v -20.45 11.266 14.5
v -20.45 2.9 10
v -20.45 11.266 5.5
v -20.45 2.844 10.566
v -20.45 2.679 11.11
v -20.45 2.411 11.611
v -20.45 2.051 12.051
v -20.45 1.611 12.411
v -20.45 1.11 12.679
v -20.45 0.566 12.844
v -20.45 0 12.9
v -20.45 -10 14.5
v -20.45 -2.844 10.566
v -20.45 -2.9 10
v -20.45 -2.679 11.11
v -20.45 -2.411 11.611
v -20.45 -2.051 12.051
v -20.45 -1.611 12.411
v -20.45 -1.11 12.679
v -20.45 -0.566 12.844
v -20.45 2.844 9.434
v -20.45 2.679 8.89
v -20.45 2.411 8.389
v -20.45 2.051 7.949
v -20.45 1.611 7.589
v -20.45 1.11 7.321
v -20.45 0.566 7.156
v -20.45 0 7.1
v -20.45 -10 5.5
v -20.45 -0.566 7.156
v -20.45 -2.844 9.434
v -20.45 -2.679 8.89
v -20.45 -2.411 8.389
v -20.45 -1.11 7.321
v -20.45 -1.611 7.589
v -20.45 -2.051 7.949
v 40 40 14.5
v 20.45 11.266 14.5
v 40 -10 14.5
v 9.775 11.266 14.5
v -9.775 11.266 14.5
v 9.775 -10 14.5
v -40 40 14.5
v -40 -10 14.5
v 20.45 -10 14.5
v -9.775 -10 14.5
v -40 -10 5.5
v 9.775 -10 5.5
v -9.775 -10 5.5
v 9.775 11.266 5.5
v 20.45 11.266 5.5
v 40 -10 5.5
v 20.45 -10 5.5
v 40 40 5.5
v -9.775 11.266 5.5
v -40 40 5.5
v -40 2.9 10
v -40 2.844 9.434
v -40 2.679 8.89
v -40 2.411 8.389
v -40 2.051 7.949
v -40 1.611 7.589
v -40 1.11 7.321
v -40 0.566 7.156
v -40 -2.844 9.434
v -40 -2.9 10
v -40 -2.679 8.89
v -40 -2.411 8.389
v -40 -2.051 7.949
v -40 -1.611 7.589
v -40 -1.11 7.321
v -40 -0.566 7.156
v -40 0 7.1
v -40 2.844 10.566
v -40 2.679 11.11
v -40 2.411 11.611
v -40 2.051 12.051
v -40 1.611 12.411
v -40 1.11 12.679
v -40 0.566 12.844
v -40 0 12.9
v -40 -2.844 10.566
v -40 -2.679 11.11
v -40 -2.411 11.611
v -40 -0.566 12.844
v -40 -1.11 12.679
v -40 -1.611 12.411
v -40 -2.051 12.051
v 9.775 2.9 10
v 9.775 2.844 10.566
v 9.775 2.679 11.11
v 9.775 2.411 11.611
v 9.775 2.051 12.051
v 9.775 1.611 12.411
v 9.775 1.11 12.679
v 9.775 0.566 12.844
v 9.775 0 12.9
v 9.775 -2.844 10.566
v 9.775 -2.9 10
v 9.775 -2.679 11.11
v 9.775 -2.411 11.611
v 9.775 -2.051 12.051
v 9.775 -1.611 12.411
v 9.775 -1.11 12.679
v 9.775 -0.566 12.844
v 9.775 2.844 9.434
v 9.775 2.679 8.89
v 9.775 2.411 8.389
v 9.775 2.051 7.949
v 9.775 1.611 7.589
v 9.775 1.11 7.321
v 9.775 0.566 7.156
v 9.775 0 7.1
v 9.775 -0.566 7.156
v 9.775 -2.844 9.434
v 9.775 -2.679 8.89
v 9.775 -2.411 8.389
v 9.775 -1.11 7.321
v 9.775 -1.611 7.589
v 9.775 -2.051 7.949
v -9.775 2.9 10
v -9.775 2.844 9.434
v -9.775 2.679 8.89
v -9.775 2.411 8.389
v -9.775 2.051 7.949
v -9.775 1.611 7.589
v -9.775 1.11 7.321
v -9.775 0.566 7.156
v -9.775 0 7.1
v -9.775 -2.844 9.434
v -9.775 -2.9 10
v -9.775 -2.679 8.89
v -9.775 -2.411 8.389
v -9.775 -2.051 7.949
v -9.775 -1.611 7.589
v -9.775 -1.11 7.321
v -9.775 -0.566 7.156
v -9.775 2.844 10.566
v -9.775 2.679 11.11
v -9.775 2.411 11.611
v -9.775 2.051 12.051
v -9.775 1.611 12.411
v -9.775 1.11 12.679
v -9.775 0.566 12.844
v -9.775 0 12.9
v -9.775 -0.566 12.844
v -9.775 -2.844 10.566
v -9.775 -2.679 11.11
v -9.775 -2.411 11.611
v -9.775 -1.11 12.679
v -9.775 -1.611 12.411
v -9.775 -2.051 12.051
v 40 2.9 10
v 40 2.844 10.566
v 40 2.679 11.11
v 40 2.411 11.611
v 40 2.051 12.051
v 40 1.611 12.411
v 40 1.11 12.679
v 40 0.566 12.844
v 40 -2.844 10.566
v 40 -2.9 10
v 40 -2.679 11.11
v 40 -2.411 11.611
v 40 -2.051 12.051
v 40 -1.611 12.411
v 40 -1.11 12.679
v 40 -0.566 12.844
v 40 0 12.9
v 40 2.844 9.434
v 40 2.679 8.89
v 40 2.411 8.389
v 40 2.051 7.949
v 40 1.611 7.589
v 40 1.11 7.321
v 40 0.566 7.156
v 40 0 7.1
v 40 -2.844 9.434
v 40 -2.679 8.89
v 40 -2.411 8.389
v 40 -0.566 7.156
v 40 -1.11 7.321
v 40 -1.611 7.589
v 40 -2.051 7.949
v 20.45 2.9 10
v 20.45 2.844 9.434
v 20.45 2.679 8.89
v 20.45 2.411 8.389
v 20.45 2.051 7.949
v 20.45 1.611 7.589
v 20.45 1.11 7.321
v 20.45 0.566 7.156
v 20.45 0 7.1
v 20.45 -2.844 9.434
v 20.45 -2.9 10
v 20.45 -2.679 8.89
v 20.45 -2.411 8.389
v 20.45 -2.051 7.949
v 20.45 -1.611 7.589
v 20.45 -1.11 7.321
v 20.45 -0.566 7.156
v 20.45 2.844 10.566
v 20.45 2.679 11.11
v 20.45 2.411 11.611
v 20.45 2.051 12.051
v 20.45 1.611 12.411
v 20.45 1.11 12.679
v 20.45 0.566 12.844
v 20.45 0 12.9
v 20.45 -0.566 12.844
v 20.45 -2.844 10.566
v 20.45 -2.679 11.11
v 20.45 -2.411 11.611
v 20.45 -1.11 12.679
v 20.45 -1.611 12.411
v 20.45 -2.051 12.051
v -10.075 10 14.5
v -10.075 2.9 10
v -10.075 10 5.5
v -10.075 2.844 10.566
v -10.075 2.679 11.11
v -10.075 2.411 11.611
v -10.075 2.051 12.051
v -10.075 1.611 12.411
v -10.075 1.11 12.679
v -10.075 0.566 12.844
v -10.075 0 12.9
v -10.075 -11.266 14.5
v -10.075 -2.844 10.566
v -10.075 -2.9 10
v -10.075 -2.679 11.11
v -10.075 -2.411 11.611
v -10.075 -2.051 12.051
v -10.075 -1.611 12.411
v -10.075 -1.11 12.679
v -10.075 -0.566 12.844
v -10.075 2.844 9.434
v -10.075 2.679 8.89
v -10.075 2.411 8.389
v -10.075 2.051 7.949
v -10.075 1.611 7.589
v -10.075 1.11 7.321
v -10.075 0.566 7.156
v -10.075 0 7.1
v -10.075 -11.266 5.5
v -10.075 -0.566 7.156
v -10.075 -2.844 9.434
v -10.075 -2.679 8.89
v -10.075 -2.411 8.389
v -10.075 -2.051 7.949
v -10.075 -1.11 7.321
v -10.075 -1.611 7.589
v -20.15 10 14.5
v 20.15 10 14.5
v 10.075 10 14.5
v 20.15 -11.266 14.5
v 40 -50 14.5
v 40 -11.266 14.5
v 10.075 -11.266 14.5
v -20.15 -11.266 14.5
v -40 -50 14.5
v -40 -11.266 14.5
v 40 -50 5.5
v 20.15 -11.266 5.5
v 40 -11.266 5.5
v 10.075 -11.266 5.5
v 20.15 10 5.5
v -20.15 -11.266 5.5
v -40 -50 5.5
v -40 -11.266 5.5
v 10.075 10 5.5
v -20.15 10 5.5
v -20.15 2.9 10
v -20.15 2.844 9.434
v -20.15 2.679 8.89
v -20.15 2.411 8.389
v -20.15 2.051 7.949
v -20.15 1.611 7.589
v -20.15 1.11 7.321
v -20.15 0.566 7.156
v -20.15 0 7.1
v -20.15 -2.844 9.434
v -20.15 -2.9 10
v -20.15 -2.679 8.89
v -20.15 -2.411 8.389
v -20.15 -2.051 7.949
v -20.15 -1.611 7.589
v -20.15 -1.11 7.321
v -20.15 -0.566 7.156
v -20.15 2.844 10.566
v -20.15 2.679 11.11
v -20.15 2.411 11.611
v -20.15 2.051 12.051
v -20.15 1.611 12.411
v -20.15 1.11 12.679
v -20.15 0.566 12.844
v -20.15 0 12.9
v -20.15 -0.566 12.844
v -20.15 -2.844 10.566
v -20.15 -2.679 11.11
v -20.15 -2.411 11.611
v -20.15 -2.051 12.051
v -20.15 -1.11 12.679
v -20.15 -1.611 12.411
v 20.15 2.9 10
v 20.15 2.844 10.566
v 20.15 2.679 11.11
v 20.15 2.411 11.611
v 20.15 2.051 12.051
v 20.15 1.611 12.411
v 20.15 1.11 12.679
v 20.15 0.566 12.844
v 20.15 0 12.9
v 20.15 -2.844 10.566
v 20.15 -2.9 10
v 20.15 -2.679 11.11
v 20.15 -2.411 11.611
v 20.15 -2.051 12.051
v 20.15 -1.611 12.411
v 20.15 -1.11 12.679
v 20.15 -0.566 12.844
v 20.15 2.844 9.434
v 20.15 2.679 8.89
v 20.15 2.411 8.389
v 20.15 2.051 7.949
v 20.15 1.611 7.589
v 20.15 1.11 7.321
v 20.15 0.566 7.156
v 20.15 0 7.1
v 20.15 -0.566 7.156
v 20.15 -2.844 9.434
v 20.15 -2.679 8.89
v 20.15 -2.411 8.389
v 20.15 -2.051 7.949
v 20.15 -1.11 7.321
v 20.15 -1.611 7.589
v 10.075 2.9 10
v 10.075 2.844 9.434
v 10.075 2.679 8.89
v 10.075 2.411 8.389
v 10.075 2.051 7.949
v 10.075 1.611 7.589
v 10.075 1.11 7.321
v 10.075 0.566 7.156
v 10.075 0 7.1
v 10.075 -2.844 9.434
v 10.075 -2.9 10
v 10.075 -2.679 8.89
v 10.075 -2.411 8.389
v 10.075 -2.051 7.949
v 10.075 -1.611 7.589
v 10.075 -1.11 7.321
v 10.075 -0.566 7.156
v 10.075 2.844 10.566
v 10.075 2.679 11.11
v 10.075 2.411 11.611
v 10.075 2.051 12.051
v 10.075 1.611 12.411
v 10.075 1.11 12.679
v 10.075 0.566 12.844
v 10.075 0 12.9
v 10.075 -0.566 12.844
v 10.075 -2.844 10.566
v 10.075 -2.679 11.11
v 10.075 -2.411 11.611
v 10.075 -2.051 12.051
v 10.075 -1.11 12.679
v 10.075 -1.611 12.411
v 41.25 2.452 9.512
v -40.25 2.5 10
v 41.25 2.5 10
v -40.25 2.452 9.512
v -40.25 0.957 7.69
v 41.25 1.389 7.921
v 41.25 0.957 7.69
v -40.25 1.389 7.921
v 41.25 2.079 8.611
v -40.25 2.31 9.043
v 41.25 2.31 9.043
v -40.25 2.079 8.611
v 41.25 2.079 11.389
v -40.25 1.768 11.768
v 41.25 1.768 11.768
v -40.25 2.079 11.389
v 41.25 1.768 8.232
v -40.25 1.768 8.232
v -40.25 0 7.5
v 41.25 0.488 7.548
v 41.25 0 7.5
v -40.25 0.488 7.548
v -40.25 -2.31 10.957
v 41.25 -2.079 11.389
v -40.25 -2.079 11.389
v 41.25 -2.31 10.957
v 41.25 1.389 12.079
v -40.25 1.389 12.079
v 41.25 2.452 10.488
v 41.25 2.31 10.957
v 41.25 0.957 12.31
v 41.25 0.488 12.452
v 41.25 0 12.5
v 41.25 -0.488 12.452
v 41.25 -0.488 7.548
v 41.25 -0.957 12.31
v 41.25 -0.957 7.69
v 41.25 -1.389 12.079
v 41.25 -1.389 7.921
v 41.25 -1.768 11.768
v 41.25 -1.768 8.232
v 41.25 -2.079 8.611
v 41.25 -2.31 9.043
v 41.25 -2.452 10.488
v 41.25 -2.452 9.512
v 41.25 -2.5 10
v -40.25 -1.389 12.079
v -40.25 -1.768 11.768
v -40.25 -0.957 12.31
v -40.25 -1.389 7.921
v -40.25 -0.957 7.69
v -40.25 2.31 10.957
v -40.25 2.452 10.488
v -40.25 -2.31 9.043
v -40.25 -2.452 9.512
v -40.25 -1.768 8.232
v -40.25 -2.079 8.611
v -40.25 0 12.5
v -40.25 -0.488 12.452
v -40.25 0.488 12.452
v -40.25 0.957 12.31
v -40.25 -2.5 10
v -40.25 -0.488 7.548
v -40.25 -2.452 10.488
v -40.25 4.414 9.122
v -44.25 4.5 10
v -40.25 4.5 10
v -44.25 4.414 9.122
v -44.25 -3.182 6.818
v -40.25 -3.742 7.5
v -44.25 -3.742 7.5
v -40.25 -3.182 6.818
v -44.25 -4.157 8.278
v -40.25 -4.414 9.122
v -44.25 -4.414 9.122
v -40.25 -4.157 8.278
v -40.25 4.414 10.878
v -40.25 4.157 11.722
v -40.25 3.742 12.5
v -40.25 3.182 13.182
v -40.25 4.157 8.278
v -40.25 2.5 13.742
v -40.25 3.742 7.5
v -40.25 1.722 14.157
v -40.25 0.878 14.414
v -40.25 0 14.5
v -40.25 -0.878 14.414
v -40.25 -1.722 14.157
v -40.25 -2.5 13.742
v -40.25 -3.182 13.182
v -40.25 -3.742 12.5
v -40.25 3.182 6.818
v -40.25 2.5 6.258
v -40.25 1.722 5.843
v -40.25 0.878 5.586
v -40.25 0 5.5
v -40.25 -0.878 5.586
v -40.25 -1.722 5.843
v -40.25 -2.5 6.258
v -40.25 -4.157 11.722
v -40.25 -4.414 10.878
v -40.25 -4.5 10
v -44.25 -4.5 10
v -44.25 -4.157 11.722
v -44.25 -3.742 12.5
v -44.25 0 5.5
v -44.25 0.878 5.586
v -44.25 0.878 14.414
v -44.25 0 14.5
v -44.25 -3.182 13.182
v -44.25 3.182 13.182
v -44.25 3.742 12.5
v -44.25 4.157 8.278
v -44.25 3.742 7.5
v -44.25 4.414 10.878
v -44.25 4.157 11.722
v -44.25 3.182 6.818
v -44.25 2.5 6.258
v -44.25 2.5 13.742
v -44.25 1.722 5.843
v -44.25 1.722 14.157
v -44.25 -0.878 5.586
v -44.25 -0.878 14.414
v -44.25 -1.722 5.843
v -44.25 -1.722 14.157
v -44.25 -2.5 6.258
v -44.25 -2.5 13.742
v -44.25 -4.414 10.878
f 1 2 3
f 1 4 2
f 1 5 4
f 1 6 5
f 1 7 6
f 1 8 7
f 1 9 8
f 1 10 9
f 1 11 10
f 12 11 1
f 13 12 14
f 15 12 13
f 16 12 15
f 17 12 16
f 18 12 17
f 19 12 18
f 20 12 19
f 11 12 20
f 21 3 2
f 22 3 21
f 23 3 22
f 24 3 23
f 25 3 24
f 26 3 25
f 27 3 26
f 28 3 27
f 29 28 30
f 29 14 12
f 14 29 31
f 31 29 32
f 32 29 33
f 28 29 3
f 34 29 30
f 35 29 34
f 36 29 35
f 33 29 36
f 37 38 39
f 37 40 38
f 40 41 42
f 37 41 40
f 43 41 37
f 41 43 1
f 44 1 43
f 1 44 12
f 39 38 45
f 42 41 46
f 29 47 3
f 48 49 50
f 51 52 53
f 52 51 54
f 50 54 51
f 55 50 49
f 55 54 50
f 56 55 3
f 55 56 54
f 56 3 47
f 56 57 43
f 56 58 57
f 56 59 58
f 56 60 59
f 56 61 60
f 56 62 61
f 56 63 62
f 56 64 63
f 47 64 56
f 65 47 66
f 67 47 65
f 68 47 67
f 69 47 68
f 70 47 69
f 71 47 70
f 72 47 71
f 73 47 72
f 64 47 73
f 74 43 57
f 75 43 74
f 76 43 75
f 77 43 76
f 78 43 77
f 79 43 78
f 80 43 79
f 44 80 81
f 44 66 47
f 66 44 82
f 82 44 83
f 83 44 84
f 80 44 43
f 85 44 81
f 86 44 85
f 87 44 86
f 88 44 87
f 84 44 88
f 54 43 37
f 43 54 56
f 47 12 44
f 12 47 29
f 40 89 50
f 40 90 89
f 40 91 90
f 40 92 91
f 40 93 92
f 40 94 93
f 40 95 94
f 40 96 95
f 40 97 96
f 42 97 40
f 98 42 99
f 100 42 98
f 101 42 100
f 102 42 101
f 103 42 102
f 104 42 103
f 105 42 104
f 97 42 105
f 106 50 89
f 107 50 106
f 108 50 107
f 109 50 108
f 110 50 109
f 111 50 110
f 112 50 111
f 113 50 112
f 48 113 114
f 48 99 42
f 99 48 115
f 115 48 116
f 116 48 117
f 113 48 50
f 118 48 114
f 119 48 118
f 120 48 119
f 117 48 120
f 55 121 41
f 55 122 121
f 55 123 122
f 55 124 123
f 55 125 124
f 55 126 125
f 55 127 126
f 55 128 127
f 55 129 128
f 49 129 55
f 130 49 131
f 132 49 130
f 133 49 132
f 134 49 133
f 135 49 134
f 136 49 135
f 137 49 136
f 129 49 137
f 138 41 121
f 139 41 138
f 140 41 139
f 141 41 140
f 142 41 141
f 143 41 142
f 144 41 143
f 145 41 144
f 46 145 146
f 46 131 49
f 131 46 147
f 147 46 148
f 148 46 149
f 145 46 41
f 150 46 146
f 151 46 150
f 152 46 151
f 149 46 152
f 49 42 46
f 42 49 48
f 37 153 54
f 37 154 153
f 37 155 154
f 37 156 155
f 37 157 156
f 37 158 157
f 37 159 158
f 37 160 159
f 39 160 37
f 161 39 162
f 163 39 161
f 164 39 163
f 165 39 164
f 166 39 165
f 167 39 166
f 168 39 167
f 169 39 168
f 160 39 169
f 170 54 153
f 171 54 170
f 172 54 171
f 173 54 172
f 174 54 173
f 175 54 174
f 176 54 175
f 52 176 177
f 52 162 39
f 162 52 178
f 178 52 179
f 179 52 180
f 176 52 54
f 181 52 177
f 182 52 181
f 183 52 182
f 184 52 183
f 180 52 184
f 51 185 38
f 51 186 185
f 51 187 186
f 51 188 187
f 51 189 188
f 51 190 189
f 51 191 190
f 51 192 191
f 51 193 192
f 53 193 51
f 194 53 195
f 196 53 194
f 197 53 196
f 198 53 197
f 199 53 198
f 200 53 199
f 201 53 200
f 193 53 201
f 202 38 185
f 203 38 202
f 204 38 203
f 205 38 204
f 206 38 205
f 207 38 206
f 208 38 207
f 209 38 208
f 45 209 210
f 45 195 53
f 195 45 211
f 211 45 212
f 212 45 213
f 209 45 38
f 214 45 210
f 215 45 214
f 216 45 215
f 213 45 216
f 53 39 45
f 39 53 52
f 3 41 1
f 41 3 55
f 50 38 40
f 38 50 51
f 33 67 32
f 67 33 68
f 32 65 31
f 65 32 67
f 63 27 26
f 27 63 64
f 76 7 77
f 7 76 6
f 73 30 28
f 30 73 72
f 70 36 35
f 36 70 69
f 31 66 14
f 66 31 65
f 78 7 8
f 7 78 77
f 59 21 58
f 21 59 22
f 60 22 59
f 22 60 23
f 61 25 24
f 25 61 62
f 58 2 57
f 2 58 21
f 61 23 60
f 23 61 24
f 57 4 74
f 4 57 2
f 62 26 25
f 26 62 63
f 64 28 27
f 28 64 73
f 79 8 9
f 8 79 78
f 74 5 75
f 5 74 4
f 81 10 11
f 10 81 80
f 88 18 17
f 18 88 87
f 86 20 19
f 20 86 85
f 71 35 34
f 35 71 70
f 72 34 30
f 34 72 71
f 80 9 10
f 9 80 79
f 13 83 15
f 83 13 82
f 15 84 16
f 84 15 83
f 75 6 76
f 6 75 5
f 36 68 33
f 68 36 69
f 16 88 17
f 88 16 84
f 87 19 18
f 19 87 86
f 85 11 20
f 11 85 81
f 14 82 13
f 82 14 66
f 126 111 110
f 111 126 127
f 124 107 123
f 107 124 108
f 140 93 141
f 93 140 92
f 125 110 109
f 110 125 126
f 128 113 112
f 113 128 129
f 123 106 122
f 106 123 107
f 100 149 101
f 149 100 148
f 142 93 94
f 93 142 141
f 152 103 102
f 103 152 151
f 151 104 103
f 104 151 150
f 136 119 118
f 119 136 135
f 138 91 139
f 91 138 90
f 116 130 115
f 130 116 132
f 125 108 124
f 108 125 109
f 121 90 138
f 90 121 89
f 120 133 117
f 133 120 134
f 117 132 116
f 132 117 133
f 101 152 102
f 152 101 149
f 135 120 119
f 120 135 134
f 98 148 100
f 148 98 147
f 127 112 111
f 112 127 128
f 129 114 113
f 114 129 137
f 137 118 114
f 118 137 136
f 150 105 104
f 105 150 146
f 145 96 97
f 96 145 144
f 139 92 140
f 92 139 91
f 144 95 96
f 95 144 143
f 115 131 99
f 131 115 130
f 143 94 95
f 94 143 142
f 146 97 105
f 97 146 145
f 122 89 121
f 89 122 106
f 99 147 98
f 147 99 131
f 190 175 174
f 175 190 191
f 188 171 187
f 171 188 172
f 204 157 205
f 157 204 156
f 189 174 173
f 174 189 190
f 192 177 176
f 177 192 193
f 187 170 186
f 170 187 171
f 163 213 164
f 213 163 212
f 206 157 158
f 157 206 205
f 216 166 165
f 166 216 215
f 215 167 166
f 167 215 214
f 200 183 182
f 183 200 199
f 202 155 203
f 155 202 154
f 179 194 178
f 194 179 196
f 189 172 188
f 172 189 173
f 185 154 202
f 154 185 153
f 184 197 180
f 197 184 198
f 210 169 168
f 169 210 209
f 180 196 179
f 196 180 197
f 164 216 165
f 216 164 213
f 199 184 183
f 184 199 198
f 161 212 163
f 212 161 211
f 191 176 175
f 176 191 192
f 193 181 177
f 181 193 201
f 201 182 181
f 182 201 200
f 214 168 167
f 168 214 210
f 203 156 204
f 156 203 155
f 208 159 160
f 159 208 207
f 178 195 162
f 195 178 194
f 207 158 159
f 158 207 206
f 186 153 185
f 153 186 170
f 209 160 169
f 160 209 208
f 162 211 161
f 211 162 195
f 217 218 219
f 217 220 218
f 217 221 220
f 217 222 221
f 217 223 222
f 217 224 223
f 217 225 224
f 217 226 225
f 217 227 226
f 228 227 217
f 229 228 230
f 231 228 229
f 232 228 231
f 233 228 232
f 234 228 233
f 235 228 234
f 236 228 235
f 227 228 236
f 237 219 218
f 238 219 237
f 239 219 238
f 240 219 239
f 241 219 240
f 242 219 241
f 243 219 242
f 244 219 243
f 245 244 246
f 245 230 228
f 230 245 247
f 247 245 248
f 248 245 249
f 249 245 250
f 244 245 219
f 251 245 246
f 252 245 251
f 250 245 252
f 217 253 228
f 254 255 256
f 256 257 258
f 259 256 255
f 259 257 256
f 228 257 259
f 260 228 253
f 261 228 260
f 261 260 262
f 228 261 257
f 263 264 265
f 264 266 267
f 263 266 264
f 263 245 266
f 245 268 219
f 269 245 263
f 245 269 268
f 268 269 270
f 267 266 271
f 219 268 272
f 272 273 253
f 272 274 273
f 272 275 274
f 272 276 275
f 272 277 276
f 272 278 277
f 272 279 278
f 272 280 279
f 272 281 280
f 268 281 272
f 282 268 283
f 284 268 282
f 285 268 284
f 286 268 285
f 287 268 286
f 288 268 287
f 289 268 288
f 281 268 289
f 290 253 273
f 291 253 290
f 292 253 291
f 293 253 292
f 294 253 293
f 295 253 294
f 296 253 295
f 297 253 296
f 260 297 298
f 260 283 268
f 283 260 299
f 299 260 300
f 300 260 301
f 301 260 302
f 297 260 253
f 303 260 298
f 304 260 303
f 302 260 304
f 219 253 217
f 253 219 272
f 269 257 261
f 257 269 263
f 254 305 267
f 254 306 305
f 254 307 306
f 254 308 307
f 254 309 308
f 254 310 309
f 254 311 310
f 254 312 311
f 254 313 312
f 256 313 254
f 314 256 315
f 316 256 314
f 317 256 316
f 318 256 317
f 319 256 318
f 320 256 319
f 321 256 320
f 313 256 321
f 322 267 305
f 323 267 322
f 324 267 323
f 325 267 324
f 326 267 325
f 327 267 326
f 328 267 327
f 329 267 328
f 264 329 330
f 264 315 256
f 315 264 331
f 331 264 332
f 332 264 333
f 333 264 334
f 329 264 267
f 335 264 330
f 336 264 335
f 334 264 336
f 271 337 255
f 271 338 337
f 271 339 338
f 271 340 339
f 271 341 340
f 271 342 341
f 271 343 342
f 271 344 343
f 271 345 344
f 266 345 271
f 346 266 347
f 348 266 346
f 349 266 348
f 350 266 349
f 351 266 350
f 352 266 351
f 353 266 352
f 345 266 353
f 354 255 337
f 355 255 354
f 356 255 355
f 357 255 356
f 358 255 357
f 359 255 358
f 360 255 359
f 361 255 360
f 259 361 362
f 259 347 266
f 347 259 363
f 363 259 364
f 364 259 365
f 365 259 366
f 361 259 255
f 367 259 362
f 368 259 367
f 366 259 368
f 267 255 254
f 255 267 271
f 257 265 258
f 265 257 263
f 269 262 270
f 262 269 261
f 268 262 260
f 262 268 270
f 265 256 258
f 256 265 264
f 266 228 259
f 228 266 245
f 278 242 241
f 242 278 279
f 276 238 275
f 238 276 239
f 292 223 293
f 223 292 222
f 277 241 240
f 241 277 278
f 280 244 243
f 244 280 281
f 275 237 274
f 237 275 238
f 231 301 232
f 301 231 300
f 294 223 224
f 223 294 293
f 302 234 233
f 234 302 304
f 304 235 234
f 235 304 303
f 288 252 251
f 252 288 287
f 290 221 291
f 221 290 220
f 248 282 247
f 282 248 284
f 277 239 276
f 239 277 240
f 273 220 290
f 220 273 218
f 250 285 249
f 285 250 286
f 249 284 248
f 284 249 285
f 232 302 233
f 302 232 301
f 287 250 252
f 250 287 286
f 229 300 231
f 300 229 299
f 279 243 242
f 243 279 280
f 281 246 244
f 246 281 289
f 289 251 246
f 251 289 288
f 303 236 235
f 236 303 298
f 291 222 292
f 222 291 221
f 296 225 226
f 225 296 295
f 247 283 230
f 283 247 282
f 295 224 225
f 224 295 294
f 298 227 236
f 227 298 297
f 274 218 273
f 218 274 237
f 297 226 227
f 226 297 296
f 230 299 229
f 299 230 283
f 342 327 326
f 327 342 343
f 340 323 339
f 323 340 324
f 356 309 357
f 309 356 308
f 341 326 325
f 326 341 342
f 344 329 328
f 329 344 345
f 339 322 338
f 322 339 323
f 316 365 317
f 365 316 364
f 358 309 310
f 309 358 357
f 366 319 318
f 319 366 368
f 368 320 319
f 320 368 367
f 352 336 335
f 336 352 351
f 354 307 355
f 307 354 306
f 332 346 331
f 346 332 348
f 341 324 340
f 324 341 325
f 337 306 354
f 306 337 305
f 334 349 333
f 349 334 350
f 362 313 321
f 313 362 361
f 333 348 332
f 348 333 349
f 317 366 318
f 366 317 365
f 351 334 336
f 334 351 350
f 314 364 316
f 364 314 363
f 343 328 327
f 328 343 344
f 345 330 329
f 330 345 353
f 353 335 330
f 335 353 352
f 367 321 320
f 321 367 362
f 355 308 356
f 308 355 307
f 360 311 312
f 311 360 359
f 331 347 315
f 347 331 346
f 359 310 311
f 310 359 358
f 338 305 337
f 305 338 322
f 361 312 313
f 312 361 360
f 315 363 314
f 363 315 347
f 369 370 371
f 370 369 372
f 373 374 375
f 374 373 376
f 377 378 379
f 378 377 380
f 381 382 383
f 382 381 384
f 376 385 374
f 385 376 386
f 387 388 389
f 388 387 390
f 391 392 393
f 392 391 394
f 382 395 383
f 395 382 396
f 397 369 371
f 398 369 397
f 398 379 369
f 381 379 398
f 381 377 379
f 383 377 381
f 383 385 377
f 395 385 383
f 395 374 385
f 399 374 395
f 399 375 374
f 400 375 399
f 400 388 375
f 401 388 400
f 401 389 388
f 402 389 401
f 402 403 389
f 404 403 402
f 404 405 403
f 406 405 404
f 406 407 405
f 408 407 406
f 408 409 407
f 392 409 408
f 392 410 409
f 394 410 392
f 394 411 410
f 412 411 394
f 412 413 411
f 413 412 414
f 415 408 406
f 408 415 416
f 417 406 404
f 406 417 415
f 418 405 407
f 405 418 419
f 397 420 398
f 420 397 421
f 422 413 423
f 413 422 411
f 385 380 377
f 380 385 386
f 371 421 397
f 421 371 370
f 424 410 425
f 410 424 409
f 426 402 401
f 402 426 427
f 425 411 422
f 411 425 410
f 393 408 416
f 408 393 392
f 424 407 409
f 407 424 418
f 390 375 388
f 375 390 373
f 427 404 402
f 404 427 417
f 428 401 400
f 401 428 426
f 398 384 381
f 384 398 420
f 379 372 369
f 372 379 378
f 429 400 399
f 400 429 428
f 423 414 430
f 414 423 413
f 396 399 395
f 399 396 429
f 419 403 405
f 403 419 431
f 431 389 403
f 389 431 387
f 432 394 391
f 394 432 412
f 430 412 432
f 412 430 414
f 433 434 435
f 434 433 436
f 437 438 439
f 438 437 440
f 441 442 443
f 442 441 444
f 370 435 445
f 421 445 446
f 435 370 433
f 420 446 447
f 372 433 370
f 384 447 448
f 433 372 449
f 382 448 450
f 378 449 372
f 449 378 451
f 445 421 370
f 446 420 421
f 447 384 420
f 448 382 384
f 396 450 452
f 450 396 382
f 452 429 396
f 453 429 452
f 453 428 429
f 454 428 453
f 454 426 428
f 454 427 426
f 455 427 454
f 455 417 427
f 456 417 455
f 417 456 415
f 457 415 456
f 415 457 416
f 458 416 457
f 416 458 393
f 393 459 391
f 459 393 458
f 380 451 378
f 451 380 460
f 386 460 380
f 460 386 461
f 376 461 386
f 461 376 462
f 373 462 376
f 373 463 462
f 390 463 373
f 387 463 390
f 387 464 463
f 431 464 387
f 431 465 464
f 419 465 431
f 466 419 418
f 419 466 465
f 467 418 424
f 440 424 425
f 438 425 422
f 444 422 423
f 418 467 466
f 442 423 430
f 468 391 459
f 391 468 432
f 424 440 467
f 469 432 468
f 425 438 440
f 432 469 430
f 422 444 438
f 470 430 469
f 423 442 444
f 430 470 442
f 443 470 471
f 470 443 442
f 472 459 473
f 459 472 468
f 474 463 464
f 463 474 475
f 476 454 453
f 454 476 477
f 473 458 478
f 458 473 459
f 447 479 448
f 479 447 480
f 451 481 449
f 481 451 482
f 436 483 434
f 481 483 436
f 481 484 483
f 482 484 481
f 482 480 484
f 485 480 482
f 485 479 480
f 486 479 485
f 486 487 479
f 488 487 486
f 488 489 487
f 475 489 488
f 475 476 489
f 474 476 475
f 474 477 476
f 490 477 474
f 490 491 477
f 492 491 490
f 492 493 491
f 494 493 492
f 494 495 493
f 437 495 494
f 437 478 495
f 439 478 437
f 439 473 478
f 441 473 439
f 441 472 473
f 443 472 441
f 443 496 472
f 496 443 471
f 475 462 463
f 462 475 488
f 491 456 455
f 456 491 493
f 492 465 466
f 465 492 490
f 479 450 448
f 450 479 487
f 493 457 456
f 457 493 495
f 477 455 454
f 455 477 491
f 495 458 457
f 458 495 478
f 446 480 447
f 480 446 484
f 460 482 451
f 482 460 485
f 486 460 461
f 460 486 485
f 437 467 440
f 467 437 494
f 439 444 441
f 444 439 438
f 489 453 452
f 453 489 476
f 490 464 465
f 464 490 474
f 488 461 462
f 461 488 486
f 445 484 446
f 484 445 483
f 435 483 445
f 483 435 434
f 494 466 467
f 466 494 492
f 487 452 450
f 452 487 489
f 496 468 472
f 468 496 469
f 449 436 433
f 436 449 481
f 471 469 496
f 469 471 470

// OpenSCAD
$fn = 32;

// ------------------------------------------------------------------------
// Butt hinge: hinge 80 mm, leaf swung 0 deg
// Every part is its own module, assembly() places every instance.
// ------------------------------------------------------------------------

// --- part 1 ---
module hinge_base() {
  difference() {
    union() {
      translate([-40, -10, -4.5]) cube([19.55, 50, 9]);
      translate([-9.775, -10, -4.5]) cube([19.55, 50, 9]);
      translate([20.45, -10, -4.5]) cube([19.55, 50, 9]);
      translate([-40, 11.266, -4.5]) cube([80, 28.734, 9]);
    }
    translate([-30.225, 0, 0]) rotate([0, 90, 0]) cylinder(h = 21.55, d = 5.8, center = true);
    translate([0, 0, 0]) rotate([0, 90, 0]) cylinder(h = 21.55, d = 5.8, center = true);
    translate([30.225, 0, 0]) rotate([0, 90, 0]) cylinder(h = 21.55, d = 5.8, center = true);
  }
}

// --- part 2 ---
module hinge_mover() {
  difference() {
    union() {
      translate([-20.15, -50, -4.5]) cube([10.075, 60, 9]);
      translate([10.075, -50, -4.5]) cube([10.075, 60, 9]);
      translate([-40, -50, -4.5]) cube([80, 38.734, 9]);
    }
    translate([-15.113, 0, 0]) rotate([0, 90, 0]) cylinder(h = 12.075, d = 5.8, center = true);
    translate([15.113, 0, 0]) rotate([0, 90, 0]) cylinder(h = 12.075, d = 5.8, center = true);
  }
}

// --- part 3 ---
module hinge_pin() {
  rotate([0, 90, 0]) cylinder(h = 82.5, d = 5, center = true);
  translate([-44.25, 0, 0]) rotate([0, 90, 0]) cylinder(h = 4, d = 9);
}

// --- assembly ---
module assembly() {
  color([0.80, 0.24, 0.20]) translate([0, 0, 10]) rotate([0, 0, 0]) hinge_base();
  color([0.20, 0.45, 0.75]) translate([0, 0, 10]) rotate([0, 0, 0]) hinge_mover();
  color([0.25, 0.62, 0.32]) translate([0, 0, 10]) rotate([0, 0, 0]) hinge_pin();
}

assembly();
